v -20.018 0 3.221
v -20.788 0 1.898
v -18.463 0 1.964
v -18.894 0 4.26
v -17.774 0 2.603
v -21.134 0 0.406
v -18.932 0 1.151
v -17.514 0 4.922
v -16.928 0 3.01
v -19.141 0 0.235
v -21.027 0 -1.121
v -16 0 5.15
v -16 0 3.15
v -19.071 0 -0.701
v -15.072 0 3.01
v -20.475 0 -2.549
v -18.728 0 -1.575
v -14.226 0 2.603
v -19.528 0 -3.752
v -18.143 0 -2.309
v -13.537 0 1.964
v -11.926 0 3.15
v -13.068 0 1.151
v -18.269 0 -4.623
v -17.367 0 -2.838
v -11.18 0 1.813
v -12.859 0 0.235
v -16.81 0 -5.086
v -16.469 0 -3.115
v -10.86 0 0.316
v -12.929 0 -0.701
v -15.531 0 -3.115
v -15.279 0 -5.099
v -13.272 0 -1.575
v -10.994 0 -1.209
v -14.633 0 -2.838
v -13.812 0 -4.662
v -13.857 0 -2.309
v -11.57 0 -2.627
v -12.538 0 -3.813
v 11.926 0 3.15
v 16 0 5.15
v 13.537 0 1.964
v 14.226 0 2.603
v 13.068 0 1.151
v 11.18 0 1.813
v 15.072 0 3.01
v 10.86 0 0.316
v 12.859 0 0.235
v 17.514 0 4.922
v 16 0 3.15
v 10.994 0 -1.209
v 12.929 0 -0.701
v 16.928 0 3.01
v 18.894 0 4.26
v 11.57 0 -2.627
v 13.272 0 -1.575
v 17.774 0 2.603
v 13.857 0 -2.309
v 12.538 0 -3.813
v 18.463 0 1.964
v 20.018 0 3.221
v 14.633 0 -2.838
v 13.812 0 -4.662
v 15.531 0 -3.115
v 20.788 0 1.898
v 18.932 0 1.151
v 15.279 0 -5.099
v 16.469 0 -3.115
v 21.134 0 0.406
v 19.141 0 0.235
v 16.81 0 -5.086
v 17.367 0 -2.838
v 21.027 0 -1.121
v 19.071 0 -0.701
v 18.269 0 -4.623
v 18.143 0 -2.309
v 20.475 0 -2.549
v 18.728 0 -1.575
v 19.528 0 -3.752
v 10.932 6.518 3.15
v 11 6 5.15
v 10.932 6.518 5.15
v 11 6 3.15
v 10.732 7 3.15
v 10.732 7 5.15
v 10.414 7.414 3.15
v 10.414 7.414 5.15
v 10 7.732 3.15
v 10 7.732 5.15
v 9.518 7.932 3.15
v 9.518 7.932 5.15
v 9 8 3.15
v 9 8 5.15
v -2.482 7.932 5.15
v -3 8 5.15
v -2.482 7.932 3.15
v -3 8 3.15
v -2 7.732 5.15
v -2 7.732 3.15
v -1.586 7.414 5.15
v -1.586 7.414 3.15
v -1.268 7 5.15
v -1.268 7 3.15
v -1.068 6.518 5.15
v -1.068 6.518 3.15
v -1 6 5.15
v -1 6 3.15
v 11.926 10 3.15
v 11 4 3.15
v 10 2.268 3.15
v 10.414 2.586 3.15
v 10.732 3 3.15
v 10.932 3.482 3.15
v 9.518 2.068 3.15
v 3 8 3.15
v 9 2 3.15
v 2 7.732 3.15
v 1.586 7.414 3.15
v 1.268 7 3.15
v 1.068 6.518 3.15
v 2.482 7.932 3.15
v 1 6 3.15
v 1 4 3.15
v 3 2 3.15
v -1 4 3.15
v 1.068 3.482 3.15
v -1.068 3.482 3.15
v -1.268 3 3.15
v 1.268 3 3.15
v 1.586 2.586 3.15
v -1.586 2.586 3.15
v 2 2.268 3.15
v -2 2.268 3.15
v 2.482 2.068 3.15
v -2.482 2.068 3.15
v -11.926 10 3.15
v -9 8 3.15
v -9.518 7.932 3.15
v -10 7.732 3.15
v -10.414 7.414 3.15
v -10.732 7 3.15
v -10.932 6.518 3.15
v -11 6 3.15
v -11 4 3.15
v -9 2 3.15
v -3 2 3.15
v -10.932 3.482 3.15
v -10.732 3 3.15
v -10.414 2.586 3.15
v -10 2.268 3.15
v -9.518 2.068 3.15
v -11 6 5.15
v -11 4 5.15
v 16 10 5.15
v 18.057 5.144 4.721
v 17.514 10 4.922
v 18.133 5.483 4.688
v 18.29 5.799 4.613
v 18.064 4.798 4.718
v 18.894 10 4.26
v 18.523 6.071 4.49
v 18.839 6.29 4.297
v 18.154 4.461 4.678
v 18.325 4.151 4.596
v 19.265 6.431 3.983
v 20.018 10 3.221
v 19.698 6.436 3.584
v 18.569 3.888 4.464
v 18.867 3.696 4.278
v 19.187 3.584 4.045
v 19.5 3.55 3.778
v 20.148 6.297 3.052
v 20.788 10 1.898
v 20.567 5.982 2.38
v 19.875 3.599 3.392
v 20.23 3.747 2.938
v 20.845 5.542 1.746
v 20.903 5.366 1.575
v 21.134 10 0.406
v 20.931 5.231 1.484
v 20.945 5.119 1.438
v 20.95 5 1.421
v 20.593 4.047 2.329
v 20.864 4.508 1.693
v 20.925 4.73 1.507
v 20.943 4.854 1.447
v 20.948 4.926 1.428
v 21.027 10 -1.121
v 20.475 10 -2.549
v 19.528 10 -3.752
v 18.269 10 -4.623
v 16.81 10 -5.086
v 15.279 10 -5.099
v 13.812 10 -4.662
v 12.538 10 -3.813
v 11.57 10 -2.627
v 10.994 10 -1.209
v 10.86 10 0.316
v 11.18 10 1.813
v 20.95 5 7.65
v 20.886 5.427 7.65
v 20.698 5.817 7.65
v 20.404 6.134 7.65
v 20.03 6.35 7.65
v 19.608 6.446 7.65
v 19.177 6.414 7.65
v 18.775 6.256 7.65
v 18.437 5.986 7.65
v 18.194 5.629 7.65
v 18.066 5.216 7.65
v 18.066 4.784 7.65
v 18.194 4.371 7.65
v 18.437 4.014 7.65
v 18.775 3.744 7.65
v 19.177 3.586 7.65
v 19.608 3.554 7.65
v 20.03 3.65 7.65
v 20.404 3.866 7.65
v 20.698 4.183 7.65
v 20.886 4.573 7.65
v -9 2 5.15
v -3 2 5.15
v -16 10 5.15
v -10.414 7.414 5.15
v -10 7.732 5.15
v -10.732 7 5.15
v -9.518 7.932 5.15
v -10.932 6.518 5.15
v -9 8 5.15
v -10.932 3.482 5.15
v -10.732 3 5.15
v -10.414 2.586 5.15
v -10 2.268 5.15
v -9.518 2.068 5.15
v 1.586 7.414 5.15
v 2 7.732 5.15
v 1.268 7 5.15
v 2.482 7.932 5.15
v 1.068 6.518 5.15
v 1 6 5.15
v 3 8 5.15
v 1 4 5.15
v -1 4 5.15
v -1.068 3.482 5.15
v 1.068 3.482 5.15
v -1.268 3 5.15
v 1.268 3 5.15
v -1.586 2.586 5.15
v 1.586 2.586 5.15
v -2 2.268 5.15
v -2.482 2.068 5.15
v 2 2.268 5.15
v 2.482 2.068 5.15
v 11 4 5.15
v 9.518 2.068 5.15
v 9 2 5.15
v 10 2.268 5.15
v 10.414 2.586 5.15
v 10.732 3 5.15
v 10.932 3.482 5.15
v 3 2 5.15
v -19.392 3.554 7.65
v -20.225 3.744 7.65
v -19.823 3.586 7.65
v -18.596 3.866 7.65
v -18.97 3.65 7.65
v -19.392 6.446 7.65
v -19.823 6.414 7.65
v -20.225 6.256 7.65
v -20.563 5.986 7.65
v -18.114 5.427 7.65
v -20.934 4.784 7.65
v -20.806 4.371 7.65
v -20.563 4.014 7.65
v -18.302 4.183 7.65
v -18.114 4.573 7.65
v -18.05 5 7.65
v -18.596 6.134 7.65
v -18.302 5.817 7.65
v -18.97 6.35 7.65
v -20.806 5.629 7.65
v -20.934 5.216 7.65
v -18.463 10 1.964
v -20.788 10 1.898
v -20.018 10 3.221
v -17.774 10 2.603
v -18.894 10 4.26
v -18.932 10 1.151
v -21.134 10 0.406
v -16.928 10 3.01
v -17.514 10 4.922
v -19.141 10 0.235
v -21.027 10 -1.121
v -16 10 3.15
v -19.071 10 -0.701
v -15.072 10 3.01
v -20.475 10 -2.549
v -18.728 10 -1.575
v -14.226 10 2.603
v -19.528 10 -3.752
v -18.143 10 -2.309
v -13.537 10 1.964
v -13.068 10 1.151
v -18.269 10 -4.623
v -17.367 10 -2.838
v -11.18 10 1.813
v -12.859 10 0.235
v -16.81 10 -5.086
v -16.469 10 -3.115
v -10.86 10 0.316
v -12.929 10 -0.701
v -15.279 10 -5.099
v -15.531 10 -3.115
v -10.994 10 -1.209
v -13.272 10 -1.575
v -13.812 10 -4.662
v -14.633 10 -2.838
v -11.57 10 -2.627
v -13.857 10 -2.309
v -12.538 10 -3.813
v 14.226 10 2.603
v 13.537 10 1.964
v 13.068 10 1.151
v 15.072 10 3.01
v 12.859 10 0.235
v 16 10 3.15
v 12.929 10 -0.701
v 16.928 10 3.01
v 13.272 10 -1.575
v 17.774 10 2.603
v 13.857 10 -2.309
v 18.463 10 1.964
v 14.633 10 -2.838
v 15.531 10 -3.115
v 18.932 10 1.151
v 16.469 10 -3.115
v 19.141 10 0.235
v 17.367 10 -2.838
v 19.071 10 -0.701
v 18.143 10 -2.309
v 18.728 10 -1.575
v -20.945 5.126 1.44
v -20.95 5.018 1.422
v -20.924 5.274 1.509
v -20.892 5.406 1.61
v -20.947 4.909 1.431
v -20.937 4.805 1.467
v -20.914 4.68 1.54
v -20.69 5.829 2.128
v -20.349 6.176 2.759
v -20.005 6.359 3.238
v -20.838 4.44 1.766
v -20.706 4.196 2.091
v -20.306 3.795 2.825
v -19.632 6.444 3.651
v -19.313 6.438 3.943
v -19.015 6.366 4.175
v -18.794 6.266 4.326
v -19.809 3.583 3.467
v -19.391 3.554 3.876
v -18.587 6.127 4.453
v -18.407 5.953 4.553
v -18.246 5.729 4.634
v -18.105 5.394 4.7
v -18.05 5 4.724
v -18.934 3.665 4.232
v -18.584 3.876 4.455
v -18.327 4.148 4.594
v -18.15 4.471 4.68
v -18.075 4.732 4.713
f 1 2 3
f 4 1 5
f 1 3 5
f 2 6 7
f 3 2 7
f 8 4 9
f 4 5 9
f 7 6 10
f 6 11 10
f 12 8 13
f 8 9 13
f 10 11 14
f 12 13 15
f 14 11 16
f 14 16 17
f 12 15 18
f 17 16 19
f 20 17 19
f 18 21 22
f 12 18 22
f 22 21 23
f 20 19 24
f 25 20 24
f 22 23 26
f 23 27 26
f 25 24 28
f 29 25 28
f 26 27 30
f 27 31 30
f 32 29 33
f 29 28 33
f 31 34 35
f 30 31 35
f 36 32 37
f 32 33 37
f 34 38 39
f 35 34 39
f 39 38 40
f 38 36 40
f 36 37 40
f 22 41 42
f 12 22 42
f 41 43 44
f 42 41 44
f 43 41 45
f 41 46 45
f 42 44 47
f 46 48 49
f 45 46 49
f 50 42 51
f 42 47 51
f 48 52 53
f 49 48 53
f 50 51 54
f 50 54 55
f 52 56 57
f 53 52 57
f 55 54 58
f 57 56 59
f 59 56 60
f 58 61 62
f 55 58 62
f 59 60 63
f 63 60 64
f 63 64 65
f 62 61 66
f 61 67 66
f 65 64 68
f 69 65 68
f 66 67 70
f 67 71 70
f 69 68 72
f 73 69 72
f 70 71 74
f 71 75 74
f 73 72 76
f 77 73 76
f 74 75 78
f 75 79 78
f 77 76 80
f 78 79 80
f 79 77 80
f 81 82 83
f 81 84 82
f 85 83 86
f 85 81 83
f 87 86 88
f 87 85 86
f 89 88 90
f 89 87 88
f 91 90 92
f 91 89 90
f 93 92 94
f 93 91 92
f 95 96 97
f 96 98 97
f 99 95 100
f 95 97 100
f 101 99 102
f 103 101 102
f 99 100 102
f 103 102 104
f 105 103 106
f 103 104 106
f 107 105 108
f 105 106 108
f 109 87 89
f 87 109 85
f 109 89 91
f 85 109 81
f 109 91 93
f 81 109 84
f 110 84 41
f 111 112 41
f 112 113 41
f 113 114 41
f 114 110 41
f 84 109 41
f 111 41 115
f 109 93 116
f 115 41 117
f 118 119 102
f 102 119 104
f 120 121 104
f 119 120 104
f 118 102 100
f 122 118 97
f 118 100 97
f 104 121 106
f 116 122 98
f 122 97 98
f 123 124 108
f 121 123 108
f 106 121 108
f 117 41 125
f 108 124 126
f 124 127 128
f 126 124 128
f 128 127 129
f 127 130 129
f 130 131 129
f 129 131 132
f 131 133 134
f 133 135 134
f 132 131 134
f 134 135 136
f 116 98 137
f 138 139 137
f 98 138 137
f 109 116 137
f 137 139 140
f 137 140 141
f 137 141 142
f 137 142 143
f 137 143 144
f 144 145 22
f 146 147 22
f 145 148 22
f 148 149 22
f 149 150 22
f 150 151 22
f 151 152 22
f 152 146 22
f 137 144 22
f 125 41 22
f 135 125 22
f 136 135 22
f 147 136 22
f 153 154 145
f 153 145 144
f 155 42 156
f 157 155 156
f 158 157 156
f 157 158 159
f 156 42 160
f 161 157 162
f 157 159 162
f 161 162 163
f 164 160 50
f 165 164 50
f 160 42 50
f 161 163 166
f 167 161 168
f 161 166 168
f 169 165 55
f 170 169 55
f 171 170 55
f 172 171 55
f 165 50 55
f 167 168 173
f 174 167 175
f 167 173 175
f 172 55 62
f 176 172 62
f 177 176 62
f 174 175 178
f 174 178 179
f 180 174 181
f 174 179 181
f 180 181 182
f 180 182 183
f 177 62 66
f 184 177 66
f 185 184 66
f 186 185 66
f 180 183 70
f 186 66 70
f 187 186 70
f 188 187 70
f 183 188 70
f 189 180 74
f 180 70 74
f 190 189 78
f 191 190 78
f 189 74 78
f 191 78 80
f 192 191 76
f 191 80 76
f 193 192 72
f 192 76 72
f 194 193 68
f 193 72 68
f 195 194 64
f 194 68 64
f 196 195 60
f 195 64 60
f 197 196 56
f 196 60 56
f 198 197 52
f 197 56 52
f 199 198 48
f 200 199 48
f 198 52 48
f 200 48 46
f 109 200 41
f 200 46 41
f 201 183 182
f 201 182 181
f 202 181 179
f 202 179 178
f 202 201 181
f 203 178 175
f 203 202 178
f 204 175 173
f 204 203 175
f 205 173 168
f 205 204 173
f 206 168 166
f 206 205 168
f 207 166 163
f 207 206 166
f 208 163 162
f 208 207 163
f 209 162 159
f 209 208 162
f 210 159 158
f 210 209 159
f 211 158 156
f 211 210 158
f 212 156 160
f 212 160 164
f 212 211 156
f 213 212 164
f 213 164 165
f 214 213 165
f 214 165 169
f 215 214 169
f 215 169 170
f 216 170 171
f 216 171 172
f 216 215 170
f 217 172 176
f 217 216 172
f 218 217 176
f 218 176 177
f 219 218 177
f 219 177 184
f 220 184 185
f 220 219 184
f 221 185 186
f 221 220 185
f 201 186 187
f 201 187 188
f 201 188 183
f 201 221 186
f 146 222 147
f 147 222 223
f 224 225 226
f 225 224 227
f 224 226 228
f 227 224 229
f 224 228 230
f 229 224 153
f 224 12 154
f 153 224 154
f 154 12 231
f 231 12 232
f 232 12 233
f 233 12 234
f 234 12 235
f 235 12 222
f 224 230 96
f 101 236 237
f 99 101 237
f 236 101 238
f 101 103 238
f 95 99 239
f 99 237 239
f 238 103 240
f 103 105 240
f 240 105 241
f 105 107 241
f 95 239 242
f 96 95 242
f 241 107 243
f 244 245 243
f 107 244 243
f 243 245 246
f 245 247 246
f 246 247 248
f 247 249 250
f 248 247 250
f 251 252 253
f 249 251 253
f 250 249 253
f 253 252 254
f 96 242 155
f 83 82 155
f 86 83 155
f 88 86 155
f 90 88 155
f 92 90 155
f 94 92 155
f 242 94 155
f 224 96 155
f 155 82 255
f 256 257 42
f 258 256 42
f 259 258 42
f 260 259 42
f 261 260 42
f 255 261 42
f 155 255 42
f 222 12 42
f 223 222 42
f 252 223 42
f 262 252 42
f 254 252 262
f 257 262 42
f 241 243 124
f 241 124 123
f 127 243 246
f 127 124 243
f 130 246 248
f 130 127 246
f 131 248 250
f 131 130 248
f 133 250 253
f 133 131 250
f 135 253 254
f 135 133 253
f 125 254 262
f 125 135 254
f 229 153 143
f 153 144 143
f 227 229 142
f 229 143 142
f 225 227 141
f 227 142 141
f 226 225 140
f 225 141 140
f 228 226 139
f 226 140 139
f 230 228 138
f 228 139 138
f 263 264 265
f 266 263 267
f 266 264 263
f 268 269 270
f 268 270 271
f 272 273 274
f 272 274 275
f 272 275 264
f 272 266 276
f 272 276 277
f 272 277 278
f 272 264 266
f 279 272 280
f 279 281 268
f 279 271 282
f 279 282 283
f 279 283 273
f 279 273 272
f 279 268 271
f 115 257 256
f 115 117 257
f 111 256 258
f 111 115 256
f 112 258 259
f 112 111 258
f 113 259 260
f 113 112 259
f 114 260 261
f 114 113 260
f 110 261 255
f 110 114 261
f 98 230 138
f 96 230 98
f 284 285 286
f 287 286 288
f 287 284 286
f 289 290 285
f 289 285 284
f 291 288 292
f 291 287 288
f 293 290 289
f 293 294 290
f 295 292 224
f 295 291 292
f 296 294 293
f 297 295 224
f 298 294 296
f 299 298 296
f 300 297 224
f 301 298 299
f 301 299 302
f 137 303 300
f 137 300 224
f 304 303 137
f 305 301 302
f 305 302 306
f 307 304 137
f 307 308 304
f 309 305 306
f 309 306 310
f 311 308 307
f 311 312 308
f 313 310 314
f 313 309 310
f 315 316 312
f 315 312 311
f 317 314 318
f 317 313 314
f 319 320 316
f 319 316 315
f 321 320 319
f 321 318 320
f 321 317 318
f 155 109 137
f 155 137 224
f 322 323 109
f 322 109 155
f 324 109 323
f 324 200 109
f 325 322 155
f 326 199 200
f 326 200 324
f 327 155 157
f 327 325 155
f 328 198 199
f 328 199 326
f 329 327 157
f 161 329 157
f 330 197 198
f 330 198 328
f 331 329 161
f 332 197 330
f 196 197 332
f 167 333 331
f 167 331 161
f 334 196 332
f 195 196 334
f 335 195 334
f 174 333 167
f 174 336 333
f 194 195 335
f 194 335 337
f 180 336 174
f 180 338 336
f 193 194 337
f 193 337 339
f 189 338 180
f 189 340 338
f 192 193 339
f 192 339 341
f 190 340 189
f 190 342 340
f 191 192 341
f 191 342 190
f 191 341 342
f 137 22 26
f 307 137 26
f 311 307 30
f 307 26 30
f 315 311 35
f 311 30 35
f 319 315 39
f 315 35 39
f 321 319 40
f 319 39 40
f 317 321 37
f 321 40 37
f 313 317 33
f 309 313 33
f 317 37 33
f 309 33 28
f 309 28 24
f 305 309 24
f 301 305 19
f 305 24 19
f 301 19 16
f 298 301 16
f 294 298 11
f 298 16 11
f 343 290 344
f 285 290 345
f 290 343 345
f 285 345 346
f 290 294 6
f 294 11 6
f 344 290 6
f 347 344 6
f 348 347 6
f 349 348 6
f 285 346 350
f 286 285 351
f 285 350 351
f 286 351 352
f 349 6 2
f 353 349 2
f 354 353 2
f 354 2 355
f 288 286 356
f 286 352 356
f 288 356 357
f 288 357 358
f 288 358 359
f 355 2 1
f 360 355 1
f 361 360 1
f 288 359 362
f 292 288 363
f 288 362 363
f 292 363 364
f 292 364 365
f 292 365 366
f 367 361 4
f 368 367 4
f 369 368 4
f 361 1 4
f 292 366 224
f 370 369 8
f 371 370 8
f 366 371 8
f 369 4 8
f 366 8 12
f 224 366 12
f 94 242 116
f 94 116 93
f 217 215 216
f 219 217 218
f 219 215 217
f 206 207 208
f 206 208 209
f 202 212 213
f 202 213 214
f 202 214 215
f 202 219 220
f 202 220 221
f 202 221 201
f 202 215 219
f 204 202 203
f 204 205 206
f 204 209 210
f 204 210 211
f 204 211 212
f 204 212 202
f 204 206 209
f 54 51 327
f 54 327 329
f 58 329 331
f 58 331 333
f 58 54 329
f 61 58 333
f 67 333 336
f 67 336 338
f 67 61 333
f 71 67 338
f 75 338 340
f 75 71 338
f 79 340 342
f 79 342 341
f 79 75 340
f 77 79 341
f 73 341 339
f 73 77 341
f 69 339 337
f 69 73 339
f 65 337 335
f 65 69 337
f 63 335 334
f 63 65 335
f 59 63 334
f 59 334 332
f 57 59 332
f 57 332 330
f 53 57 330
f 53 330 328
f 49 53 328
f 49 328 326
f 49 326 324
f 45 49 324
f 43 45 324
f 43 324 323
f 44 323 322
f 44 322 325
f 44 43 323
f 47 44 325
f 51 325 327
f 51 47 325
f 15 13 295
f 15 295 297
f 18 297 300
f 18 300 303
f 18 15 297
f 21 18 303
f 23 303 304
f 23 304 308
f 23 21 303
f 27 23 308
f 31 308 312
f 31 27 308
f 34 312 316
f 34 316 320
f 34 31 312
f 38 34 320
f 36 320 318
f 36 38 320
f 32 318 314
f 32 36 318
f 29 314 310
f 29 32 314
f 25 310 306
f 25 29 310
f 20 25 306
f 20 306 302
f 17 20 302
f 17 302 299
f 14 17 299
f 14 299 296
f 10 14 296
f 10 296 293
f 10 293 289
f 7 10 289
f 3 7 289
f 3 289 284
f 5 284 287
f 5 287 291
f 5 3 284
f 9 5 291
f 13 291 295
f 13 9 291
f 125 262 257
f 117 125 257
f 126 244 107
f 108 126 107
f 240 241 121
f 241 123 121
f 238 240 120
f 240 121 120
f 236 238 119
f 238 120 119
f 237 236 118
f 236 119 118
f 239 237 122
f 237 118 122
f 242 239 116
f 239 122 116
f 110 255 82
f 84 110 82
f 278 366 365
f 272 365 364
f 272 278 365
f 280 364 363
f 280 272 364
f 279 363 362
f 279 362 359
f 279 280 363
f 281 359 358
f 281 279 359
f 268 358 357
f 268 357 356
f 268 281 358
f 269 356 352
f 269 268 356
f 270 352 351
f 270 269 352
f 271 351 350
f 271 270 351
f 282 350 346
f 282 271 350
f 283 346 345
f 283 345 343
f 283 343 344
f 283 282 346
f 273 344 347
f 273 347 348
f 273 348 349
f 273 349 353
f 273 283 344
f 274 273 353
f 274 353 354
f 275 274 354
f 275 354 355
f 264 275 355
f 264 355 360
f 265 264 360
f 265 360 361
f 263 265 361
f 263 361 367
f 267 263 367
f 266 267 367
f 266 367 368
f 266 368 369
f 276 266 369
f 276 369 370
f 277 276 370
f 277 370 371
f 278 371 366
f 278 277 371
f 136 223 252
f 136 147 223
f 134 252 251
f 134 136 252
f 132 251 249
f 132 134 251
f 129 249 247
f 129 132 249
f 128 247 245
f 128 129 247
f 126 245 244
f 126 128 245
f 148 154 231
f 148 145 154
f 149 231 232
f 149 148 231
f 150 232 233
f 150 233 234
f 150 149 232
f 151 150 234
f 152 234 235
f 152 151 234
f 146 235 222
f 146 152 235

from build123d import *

# Parameters (mm, degrees)
SKETCH1_R           = 3.15
BOSS_EXTRUDE1_DEPTH = 10
BOSS_EXTRUDE2_REACH = 27.562
SKETCH2_R           = 1.45
BOSS_EXTRUDE3_START = 2.5
SKETCH3_R           = 1.45
BOSS_EXTRUDE3_DEPTH = 2.5
CUT_EXTRUDE1_REACH  = 27.562
SKETCH4_W           = 10
SKETCH4_H           = 6
FILLET1_R           = 2


with BuildPart() as part:
    # Sketch1 → Boss-Extrude1 (new body)
    with BuildSketch(Plane(origin=(0, 0, 0), x_dir=(1, 0, 0), z_dir=(0, 1, 0))):
        with BuildLine():
            Line((11.925690243, -3.15), (-11.925690243, -3.15))
            ThreePointArc((-11.925690243, -3.15), (-18.269361144, 4.623040125), (-16, -5.15))
            Line((-16, -5.15), (16, -5.15))
            ThreePointArc((16, -5.15), (18.269361144, 4.623040125), (11.925690243, -3.15))
        make_face()
        with Locations((-16, 0)):
            Circle(SKETCH1_R, mode=Mode.SUBTRACT)
        with Locations((16, 0)):
            Circle(SKETCH1_R, mode=Mode.SUBTRACT)
    extrude(amount=BOSS_EXTRUDE1_DEPTH)

    # Sketch2 → Boss-Extrude2 (add, up to next)
    with BuildSketch(Plane.XY.offset(5.15), mode=Mode.PRIVATE) as boss_extrude2_sk1:
        with Locations((-19.5, 5)):
            Circle(SKETCH2_R)
    boss_extrude2_tool1 = extrude(boss_extrude2_sk1.sketch, amount=-BOSS_EXTRUDE2_REACH, mode=Mode.PRIVATE) - part.part
    # Sketch2 → Boss-Extrude2 (add, up to next)
    with BuildSketch(Plane.XY.offset(5.15), mode=Mode.PRIVATE) as boss_extrude2_sk2:
        with Locations((19.5, 5)):
            Circle(SKETCH2_R)
    boss_extrude2_tool2 = extrude(boss_extrude2_sk2.sketch, amount=-BOSS_EXTRUDE2_REACH, mode=Mode.PRIVATE) - part.part
    add(boss_extrude2_tool1.solids().sort_by_distance((-19.5, 5, 5.15))[0])
    add(boss_extrude2_tool2.solids().sort_by_distance((19.5, 5, 5.15))[0])

    # Sketch3 → Boss-Extrude3 (add)
    with BuildSketch(Plane.XY.offset(5.15).offset(BOSS_EXTRUDE3_START)):
        with Locations((-19.5, 5)):
            Circle(SKETCH3_R)
        with Locations((19.5, 5)):
            Circle(SKETCH3_R)
    extrude(amount=-BOSS_EXTRUDE3_DEPTH)

    # Sketch4 → Cut-Extrude1 (cut, up to next)
    with BuildSketch(Plane.XY.offset(5.15), mode=Mode.PRIVATE) as cut_extrude1_sk1:
        with Locations((6, 5)):
            Rectangle(SKETCH4_W, SKETCH4_H)
    cut_extrude1_tool1 = extrude(cut_extrude1_sk1.sketch, amount=-CUT_EXTRUDE1_REACH, mode=Mode.PRIVATE) & part.part
    # Sketch4 → Cut-Extrude1 (cut, up to next)
    with BuildSketch(Plane.XY.offset(5.15), mode=Mode.PRIVATE) as cut_extrude1_sk2:
        with Locations((-6, 5)):
            Rectangle(SKETCH4_W, SKETCH4_H)
    cut_extrude1_tool2 = extrude(cut_extrude1_sk2.sketch, amount=-CUT_EXTRUDE1_REACH, mode=Mode.PRIVATE) & part.part
    add(cut_extrude1_tool1.solids().sort_by_distance((6, 5, 5.15))[0], mode=Mode.SUBTRACT)
    add(cut_extrude1_tool2.solids().sort_by_distance((-6, 5, 5.15))[0], mode=Mode.SUBTRACT)

    # Fillet1
    fillet1_edges = [part.edges().sort_by_distance(p)[0] for p in [
        (11, 2, 4.15),
        (11, 8, 4.15),
        (-11, 8, 4.15),
        (-11, 2, 4.15),
        (1, 2, 4.15),
        (1, 8, 4.15),
        (-1, 2, 4.15),
        (-1, 8, 4.15),
    ]]
    fillet(fillet1_edges, radius=FILLET1_R)


solid = part.part
